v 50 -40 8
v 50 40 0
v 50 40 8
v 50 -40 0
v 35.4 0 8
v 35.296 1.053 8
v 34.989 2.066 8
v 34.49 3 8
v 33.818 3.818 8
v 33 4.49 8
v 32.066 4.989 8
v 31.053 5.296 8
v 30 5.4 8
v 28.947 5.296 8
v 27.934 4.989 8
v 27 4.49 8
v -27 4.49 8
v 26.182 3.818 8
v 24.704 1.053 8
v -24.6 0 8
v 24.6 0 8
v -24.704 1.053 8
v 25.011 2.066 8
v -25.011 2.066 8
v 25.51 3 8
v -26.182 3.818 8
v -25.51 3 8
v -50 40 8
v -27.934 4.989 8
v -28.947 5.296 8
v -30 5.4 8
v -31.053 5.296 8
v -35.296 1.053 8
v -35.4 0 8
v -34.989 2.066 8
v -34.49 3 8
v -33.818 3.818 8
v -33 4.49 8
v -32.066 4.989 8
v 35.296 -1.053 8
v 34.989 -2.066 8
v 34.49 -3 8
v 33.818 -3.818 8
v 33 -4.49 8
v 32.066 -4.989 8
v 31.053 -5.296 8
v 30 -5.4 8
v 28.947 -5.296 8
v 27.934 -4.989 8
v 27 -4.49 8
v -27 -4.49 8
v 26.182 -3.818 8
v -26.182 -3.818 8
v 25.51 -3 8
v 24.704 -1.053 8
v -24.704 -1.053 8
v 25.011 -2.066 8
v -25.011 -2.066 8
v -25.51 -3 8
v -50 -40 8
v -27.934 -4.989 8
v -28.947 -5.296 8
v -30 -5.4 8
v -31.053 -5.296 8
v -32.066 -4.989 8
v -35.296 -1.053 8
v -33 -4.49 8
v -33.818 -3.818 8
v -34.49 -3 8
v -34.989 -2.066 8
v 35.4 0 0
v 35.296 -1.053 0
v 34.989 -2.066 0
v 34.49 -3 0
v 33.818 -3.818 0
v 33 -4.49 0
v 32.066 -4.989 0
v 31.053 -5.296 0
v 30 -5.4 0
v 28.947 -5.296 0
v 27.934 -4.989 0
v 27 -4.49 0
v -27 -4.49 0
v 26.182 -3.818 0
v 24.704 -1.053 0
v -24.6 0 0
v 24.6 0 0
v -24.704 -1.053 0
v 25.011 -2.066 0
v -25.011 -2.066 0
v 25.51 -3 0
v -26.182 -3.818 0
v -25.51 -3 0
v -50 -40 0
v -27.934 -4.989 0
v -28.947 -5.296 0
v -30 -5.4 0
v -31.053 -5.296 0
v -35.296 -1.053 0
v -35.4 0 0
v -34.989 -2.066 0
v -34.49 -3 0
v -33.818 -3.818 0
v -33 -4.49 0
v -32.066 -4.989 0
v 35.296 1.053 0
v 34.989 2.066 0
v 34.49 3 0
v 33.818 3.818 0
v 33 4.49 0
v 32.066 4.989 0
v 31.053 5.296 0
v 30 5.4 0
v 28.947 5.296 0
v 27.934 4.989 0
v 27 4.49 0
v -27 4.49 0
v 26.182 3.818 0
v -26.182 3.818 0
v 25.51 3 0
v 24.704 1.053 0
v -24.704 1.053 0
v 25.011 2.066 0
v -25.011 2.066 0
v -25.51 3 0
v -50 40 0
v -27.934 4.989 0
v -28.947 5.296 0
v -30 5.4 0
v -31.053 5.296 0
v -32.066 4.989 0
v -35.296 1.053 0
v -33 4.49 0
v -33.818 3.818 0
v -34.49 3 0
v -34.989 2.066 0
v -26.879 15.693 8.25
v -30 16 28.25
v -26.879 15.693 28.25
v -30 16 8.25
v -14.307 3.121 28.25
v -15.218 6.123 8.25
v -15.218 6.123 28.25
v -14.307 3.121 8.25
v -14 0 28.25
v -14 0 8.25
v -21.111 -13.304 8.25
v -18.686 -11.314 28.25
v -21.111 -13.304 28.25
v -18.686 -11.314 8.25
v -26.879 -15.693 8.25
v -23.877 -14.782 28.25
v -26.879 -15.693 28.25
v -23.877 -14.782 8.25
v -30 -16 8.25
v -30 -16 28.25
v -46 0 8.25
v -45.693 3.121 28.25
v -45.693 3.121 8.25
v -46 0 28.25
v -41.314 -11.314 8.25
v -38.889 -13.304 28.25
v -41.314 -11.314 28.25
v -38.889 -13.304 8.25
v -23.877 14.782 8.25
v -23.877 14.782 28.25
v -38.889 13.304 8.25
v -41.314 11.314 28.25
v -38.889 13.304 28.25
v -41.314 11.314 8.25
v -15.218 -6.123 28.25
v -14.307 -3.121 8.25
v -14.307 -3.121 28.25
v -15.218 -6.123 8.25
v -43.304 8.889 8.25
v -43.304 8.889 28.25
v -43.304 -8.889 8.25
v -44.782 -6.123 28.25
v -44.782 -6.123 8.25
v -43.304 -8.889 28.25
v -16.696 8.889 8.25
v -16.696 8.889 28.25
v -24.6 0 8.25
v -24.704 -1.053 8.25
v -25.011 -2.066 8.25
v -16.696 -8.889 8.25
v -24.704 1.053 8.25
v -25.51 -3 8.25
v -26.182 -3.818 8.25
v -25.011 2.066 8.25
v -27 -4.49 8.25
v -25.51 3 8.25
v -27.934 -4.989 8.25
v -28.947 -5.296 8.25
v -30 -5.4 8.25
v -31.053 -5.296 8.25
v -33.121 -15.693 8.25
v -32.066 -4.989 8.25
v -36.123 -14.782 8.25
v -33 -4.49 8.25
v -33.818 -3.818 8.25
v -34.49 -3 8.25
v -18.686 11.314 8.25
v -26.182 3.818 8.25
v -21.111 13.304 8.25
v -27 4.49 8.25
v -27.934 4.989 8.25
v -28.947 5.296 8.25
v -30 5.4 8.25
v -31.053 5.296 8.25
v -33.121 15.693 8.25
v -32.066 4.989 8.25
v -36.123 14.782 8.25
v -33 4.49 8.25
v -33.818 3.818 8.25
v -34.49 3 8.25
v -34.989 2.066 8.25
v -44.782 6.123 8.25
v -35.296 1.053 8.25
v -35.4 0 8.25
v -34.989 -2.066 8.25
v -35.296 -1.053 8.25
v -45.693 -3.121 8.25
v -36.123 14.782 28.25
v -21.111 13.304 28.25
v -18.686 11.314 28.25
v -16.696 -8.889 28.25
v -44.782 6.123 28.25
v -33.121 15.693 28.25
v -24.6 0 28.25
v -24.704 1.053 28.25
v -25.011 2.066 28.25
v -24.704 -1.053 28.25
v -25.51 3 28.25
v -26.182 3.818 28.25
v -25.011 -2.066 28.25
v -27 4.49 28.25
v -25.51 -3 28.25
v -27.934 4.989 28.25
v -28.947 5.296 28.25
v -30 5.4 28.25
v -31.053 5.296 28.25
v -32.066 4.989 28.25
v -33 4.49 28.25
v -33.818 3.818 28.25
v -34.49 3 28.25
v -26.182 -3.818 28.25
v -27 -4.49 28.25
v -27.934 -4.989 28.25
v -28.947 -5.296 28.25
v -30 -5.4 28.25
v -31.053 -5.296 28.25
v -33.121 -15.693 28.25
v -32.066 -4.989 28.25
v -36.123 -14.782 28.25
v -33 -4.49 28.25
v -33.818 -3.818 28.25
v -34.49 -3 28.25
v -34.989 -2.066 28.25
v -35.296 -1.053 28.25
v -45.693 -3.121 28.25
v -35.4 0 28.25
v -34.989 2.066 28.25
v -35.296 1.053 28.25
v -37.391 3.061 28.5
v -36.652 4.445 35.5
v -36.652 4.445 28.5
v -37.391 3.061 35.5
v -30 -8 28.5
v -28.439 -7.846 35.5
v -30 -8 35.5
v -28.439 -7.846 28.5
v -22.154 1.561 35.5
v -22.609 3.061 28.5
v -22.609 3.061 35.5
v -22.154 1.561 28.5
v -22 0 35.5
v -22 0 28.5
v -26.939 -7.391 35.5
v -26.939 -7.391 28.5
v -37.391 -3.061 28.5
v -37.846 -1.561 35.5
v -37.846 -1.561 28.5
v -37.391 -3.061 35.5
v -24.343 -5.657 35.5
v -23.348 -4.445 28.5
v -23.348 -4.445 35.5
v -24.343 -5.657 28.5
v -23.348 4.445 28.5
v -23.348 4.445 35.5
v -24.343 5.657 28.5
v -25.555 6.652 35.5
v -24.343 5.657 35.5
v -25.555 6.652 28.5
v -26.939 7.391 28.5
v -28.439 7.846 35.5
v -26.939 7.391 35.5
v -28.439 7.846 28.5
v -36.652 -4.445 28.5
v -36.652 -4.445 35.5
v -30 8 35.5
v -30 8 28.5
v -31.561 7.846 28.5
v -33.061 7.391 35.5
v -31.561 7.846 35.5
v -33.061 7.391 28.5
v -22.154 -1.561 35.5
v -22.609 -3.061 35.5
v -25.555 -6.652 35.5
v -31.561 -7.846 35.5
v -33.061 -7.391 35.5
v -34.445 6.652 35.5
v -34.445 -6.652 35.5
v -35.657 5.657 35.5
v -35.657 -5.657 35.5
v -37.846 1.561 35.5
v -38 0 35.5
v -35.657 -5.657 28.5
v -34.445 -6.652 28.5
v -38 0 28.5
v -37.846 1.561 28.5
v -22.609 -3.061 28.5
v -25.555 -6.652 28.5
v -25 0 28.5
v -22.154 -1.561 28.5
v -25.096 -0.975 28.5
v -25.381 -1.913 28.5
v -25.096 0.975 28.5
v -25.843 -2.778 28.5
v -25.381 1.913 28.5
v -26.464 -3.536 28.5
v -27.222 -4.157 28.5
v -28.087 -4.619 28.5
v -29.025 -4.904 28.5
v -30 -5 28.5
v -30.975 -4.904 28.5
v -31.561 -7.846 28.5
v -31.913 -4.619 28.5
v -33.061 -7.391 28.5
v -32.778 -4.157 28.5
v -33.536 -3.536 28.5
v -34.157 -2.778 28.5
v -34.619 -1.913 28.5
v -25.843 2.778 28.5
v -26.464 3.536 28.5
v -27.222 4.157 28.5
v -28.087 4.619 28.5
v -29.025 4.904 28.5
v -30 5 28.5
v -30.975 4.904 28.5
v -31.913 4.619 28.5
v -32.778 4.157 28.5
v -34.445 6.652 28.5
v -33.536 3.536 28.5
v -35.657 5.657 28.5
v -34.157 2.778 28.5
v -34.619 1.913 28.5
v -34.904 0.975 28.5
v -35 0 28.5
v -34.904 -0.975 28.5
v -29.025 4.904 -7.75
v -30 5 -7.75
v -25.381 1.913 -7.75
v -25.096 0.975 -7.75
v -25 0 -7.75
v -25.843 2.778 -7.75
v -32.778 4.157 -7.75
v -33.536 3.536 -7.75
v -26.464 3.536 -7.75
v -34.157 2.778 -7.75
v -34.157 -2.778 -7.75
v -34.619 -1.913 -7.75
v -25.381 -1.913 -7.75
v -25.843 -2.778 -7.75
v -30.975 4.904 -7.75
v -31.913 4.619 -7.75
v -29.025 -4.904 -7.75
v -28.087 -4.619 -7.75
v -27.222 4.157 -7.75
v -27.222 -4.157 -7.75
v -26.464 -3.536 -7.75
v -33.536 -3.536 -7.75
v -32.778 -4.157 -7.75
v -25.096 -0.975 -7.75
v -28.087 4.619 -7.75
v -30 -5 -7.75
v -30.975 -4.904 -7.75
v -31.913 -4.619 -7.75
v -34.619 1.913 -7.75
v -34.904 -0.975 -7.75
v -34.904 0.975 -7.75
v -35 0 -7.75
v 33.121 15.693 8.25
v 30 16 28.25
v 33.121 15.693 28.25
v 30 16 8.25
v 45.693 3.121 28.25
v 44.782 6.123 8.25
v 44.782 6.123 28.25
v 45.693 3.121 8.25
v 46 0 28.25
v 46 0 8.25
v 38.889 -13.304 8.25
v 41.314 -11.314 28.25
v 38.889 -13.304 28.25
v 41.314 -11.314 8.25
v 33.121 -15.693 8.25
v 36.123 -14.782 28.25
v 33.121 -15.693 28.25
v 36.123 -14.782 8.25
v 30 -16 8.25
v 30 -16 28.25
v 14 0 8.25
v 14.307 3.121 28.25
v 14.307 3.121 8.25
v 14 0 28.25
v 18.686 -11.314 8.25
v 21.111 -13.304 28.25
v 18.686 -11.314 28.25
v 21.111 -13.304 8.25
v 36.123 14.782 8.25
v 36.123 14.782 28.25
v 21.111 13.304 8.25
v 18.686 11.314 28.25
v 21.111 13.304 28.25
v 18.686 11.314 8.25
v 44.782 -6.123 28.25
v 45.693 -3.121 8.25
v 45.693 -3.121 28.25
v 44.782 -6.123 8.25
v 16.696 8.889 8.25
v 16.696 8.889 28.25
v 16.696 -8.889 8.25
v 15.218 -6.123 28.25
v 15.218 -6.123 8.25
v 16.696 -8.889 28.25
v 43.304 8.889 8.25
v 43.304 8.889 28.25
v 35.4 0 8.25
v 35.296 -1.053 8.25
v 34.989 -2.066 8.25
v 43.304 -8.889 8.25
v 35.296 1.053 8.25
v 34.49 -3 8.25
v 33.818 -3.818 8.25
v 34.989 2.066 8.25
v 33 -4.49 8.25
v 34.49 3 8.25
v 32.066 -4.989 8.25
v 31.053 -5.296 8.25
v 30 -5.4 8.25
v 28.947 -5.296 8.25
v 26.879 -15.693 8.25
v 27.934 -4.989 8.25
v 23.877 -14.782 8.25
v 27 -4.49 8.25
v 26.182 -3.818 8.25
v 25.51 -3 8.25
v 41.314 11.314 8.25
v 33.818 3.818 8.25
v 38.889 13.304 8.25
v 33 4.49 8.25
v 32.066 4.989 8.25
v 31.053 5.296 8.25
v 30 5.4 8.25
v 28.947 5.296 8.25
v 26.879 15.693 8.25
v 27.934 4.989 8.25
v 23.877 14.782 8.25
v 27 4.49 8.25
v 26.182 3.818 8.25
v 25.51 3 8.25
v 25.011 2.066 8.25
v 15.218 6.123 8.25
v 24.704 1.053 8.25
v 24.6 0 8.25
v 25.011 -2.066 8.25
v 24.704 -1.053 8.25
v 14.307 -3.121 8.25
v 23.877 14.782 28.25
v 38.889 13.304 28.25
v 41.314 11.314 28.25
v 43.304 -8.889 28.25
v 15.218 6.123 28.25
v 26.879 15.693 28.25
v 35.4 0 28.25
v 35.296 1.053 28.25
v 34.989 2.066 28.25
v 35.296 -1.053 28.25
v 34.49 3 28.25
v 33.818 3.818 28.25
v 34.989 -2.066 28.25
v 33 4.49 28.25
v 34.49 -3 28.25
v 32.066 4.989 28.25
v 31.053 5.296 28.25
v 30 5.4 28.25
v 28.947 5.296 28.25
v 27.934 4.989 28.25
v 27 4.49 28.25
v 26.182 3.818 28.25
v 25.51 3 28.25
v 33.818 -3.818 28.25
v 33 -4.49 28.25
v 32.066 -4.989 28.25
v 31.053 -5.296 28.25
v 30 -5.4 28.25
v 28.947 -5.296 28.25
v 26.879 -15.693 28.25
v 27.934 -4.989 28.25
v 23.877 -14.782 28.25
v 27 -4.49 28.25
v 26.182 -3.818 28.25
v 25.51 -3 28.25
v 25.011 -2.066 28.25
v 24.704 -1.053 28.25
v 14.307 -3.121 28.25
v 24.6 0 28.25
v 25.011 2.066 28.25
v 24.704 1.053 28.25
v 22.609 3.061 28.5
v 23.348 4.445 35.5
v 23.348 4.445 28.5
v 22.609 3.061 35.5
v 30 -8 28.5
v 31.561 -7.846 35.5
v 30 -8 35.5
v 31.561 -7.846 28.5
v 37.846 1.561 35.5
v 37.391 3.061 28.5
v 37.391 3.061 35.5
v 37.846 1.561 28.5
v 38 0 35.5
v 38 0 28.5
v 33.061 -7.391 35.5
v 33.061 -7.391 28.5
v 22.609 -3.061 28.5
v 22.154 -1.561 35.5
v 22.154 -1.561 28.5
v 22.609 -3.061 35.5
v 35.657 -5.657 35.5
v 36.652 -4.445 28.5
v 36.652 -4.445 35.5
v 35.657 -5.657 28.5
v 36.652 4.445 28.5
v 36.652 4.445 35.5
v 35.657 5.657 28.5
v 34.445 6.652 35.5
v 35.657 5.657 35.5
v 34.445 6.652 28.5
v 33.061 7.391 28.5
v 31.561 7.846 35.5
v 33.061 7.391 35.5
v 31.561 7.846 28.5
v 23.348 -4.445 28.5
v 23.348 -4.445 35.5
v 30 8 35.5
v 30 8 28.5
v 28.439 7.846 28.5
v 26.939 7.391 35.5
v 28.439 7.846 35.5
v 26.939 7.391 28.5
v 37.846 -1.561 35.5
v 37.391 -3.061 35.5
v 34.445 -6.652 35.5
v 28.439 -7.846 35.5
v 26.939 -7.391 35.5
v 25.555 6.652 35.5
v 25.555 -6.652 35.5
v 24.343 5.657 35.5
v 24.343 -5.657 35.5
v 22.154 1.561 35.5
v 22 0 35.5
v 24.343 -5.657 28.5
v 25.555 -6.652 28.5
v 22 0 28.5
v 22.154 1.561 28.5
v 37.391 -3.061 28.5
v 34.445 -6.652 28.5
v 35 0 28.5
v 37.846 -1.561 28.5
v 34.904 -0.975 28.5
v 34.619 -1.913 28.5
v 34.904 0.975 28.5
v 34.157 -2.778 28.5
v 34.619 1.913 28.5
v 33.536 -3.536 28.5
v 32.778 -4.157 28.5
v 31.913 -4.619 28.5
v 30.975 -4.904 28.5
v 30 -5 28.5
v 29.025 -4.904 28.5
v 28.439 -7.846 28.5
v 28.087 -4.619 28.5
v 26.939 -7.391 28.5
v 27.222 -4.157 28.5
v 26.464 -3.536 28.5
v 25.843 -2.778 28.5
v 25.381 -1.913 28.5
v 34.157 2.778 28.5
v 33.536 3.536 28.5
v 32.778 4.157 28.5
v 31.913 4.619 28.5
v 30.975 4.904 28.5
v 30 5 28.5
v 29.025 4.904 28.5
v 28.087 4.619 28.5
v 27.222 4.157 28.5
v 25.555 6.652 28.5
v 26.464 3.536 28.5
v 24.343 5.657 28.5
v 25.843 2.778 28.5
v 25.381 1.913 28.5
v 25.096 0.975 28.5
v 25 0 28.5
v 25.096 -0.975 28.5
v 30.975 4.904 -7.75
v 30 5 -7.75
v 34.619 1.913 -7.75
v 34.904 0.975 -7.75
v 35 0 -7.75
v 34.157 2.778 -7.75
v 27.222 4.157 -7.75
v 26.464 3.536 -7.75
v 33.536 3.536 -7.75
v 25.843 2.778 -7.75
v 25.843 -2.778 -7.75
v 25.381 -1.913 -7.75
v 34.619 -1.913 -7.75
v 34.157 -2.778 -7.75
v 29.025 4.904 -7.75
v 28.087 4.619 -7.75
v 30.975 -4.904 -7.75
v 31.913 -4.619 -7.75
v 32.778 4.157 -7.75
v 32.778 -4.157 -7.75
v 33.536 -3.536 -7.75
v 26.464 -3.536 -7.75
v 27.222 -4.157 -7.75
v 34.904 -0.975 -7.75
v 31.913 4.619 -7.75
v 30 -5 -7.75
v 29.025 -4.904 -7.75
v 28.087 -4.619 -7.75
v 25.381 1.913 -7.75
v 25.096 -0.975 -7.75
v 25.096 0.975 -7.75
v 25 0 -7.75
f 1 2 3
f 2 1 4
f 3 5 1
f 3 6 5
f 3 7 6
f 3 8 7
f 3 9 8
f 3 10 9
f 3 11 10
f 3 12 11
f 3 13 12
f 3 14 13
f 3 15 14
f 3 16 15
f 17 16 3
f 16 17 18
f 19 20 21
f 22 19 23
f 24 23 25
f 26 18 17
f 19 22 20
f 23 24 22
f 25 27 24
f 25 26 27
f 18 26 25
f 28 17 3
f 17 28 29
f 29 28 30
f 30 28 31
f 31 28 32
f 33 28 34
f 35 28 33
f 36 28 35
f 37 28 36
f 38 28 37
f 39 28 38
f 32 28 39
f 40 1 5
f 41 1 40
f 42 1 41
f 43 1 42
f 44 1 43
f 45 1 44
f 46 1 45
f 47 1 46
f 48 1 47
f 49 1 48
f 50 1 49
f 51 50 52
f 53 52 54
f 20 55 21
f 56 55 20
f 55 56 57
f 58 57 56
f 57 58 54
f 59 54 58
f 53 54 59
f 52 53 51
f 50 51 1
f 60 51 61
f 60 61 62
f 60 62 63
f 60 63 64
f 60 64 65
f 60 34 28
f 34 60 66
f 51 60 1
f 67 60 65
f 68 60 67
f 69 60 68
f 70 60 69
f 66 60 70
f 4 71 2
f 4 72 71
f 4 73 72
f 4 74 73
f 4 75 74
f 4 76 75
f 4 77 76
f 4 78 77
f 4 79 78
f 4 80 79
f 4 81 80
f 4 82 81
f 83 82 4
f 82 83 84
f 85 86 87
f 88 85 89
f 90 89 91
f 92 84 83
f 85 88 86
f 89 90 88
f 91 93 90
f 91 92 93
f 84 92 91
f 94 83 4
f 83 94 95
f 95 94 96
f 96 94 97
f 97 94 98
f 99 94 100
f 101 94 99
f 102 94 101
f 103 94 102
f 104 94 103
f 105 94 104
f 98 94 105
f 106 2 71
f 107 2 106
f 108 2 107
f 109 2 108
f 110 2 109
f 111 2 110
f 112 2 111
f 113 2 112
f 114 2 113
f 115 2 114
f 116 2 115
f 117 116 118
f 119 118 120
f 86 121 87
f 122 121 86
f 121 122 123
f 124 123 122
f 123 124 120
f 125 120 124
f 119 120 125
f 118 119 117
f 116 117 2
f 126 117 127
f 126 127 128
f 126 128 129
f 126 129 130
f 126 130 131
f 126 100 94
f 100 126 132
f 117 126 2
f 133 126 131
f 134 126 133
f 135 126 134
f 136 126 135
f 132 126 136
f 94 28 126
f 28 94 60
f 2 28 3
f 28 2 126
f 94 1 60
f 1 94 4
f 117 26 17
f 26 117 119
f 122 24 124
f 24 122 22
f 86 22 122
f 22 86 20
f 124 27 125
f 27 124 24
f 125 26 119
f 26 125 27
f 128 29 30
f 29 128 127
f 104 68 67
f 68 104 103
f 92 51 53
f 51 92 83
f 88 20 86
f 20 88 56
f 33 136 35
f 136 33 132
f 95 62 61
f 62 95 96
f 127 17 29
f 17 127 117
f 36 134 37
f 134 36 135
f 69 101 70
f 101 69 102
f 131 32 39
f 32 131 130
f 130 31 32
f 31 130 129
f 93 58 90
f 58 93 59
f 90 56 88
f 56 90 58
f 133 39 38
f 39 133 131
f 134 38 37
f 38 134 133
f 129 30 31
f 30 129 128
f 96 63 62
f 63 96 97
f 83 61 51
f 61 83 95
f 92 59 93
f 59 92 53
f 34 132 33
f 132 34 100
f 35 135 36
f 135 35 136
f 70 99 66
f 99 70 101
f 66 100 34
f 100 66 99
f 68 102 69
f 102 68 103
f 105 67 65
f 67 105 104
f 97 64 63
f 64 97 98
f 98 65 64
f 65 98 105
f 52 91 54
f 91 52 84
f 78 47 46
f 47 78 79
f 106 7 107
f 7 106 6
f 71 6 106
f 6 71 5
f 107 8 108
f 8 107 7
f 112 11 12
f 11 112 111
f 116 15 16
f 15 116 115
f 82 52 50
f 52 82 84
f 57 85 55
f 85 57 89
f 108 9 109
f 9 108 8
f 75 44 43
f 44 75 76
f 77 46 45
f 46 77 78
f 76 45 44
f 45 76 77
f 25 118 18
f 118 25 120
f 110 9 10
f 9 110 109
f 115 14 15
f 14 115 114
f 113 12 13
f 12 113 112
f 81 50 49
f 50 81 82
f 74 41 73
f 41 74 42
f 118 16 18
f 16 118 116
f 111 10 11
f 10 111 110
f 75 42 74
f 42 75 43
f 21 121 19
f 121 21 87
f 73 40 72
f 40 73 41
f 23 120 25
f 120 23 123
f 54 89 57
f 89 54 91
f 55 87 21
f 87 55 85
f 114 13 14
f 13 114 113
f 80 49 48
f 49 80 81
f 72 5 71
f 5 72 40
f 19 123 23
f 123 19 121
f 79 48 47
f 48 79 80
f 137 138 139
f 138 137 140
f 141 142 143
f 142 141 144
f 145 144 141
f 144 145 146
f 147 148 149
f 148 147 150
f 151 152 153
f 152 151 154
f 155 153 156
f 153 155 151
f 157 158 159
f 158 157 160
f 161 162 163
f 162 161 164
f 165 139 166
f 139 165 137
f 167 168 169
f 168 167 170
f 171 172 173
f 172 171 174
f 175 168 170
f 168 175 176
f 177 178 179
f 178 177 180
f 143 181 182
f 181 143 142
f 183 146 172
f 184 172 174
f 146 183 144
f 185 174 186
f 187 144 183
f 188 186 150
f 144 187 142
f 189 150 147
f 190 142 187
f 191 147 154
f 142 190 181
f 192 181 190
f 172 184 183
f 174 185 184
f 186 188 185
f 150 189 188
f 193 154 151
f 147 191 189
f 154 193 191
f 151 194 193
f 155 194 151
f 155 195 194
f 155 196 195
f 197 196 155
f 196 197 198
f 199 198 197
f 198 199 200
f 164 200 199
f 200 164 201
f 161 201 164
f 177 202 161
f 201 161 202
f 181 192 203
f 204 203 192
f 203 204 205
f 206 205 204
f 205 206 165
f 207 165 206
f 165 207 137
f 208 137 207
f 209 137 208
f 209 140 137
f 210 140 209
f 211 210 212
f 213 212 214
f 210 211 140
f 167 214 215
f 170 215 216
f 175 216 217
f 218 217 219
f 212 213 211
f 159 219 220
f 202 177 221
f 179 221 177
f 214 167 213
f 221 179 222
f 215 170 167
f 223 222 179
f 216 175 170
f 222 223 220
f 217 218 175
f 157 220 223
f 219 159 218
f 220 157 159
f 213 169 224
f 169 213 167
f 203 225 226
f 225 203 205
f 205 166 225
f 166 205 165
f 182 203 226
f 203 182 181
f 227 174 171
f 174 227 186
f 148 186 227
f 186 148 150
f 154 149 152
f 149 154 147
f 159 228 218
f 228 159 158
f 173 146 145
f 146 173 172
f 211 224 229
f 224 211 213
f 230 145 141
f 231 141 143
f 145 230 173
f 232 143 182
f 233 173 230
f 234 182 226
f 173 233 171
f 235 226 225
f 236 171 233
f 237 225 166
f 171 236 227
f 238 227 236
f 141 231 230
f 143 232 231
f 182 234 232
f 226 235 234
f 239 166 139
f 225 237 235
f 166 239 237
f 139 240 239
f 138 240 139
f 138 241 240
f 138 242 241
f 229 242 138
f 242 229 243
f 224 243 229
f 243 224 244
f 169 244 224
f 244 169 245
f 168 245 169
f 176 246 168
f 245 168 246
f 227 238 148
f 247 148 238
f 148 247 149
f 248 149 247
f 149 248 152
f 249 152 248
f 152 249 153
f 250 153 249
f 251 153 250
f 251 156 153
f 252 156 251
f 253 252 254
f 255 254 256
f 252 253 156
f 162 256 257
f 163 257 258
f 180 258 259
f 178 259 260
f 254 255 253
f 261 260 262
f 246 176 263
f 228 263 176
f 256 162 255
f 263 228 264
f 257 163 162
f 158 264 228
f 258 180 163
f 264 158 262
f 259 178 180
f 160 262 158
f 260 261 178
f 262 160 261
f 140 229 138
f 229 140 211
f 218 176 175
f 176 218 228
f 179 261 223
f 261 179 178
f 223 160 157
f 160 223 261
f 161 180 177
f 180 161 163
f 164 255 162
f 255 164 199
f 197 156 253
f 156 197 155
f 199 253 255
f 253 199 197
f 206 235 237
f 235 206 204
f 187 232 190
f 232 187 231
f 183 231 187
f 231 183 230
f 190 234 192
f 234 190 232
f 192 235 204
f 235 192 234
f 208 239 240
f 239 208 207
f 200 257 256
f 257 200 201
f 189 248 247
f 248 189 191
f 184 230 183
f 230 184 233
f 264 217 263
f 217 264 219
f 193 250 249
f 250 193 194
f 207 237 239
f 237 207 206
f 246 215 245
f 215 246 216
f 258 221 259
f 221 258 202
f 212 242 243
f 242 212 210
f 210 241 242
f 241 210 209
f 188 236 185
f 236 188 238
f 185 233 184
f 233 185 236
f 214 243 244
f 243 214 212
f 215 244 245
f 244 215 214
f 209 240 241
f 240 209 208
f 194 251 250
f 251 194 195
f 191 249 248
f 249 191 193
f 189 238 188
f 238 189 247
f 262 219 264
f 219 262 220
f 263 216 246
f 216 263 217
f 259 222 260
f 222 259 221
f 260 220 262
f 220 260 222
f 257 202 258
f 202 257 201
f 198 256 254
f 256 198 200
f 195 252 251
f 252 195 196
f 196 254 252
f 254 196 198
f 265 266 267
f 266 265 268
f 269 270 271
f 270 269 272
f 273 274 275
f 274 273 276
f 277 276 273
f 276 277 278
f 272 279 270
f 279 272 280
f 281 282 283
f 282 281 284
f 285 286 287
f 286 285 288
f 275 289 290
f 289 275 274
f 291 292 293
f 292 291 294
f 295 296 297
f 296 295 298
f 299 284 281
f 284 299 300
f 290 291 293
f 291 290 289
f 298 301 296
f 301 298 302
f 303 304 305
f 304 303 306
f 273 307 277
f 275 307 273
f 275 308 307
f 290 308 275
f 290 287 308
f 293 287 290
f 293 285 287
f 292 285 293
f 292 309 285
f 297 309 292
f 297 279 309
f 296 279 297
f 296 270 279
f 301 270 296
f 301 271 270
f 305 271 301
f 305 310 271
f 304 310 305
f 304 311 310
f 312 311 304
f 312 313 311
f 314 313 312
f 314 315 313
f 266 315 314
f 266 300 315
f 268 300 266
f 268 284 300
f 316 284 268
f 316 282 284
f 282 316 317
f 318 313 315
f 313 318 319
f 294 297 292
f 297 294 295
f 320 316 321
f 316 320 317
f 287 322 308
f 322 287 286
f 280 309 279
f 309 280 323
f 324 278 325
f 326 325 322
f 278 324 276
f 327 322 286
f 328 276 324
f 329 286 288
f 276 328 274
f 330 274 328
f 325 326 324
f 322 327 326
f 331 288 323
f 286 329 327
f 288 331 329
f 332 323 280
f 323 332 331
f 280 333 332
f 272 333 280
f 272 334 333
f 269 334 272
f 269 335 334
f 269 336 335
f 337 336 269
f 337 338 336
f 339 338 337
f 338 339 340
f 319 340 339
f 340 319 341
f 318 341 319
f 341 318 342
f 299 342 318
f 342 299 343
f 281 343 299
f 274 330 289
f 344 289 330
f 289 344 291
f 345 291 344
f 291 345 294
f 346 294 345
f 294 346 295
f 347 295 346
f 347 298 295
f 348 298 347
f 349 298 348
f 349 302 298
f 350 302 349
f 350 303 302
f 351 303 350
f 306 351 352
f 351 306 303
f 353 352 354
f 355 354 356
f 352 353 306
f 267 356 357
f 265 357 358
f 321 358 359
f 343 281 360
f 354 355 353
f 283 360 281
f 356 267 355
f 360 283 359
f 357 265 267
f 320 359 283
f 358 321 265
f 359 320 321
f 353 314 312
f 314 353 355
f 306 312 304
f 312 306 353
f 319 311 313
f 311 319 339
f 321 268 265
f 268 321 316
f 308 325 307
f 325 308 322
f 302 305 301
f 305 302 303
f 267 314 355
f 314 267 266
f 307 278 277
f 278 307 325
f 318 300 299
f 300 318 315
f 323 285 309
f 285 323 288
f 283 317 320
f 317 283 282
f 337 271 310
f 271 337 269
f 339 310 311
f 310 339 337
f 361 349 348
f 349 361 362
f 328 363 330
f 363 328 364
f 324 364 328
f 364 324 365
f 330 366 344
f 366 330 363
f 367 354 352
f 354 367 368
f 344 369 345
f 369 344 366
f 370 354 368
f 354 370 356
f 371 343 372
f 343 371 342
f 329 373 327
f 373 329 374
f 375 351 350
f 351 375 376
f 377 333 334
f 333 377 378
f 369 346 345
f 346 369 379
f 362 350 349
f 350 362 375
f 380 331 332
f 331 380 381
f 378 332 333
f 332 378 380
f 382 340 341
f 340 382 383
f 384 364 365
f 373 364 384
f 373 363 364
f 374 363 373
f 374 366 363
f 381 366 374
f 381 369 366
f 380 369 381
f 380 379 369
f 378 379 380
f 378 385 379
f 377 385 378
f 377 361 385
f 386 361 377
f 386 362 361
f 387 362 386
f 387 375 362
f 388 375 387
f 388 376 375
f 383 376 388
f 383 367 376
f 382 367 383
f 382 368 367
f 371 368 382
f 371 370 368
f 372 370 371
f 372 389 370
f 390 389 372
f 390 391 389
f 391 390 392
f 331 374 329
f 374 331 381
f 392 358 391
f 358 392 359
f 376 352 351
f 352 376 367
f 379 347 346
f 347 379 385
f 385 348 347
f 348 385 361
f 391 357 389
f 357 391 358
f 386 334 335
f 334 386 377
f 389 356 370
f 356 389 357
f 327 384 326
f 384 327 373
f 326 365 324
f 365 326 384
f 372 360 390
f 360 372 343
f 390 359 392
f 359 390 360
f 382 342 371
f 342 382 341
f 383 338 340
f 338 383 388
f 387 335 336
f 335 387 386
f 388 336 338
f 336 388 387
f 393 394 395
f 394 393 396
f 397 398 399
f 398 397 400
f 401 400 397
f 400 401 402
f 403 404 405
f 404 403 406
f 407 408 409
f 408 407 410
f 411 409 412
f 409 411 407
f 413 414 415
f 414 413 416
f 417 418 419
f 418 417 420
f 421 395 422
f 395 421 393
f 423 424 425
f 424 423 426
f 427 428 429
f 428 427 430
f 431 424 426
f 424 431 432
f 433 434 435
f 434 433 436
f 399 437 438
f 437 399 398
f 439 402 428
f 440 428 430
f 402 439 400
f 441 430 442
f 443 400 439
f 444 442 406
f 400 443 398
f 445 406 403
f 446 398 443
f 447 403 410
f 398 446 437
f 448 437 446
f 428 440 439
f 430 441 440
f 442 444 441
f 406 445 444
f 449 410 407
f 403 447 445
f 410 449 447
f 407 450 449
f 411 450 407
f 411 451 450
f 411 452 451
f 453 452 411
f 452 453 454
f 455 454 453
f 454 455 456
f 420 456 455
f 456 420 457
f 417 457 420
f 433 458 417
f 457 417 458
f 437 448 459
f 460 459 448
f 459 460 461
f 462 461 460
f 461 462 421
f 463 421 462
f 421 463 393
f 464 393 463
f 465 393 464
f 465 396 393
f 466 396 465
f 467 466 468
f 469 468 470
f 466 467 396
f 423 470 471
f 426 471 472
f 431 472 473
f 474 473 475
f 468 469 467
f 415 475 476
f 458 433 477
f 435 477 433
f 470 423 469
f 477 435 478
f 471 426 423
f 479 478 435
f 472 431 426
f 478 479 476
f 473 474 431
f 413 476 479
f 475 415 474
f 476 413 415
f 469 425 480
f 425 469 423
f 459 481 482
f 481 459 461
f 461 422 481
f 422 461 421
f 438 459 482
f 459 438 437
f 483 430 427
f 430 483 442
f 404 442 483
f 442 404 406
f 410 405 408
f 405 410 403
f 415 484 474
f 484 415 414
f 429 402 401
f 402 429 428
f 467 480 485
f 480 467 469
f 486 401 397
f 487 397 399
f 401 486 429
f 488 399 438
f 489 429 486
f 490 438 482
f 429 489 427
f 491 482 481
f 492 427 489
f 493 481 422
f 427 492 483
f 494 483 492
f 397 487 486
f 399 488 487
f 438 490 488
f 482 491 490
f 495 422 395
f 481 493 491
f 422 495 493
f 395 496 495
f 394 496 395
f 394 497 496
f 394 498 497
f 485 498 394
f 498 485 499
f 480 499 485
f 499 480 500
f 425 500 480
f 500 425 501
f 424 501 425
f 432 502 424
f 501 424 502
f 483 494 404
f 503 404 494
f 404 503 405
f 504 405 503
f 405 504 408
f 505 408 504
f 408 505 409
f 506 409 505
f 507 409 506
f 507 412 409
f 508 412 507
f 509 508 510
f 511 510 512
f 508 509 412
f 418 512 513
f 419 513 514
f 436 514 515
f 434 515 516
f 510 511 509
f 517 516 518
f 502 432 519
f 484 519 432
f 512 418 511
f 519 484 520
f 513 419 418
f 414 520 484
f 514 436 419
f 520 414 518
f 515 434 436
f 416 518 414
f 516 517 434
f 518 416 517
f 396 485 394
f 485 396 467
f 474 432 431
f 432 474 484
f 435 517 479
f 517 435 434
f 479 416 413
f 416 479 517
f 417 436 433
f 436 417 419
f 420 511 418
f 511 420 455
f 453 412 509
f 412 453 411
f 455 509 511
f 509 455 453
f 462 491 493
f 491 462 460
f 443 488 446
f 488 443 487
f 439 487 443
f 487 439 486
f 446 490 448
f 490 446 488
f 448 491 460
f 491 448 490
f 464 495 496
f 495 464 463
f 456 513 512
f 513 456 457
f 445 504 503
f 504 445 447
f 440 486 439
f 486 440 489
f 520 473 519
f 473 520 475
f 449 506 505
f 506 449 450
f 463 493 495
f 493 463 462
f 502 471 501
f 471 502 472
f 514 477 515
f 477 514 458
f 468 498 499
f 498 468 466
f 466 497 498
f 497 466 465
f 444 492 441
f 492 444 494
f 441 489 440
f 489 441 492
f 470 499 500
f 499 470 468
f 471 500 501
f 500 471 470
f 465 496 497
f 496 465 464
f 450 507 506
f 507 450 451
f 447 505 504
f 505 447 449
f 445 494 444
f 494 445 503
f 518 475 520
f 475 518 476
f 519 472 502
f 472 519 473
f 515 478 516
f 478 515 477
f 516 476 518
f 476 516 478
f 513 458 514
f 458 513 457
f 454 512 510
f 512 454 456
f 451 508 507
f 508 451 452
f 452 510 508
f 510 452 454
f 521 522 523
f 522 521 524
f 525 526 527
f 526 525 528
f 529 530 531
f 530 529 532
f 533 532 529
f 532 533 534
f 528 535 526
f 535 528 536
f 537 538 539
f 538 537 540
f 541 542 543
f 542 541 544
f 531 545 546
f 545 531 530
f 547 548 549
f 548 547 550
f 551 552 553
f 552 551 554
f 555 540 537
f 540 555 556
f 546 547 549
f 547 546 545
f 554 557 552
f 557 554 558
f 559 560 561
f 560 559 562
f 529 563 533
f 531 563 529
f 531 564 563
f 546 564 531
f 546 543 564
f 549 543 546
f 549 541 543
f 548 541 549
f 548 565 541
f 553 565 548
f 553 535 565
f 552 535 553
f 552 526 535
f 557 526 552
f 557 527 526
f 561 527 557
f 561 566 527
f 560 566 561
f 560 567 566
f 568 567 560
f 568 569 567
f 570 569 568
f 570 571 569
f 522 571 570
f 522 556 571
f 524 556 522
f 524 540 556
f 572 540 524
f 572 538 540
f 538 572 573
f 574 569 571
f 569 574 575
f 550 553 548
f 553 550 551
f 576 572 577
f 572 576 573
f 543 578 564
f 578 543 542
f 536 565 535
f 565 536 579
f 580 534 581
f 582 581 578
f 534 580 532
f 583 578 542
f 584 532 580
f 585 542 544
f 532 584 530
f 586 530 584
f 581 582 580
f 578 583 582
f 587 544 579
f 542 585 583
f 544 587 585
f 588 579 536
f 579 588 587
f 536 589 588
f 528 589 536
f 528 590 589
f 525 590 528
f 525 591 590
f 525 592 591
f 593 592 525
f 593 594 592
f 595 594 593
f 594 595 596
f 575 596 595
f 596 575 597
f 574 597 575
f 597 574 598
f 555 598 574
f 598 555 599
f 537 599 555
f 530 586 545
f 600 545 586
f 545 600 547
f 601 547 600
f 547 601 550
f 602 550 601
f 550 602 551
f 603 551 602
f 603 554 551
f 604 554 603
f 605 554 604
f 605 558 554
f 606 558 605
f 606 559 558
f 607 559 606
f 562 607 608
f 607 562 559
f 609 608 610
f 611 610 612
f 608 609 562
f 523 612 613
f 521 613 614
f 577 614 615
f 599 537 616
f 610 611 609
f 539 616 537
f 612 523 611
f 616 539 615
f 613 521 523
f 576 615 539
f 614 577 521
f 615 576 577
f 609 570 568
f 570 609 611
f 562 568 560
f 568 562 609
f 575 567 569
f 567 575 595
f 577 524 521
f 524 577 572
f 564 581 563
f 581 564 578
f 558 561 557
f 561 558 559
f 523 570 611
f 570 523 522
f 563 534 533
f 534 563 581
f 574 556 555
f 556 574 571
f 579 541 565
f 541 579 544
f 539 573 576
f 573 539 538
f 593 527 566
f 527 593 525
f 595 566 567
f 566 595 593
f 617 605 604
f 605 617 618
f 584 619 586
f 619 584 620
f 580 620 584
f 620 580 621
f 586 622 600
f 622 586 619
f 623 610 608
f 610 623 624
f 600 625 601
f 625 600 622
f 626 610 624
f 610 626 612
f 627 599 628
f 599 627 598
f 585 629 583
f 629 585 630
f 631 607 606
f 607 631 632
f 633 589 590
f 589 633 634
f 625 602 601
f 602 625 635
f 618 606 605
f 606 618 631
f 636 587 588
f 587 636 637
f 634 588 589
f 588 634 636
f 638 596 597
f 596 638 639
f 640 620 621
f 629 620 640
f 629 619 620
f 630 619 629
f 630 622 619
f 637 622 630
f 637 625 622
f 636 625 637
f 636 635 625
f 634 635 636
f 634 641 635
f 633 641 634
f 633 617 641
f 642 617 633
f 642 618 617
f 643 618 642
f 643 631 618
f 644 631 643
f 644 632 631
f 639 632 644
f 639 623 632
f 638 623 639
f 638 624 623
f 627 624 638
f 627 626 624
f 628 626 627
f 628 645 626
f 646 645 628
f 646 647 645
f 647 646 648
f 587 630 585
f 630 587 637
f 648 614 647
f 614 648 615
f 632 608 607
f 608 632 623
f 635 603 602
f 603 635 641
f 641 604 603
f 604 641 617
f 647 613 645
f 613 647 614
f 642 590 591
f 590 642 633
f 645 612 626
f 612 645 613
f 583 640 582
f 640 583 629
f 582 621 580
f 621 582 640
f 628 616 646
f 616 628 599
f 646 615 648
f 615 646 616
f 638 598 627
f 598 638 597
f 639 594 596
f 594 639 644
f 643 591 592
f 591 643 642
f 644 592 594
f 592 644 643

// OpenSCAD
$fn = 32;

// ------------------------------------------------------------------------
// Standoff columns: 2 d32 standoffs, bolts d10
// Every part is its own module, assembly() places them once.
// ------------------------------------------------------------------------

// --- part 1 ---
module base_plate() {
  difference() {
    translate([-50, -40, 0]) cube([100, 80, 8]);
    translate([-30, 0, -1]) cylinder(h = 10, d = 10.8);
    translate([30, 0, -1]) cylinder(h = 10, d = 10.8);
  }
}

// --- part 2 ---
module spacer1() {
  difference() {
      translate([0, 0, 0]) cylinder(h = 20, d = 32);
      translate([0, 0, -1]) cylinder(h = 22, d = 10.8);
    }
}

// --- part 3 ---
module bolt1() {
  cylinder(h = 7, d = 16);
  translate([0, 0, -36.25]) cylinder(h = 36.25, d = 10);
}

// --- part 4 ---
module spacer2() {
  difference() {
      translate([0, 0, 0]) cylinder(h = 20, d = 32);
      translate([0, 0, -1]) cylinder(h = 22, d = 10.8);
    }
}

// --- part 5 ---
module bolt2() {
  cylinder(h = 7, d = 16);
  translate([0, 0, -36.25]) cylinder(h = 36.25, d = 10);
}

// --- assembly ---
module assembly() {
  translate([0, 0, 0]) rotate([0, 0, 0]) base_plate();
  translate([-30, 0, 8.25]) rotate([0, 0, 0]) spacer1();
  translate([-30, 0, 28.5]) rotate([0, 0, 0]) bolt1();
  translate([30, 0, 8.25]) rotate([0, 0, 0]) spacer2();
  translate([30, 0, 28.5]) rotate([0, 0, 0]) bolt2();
}

assembly();
